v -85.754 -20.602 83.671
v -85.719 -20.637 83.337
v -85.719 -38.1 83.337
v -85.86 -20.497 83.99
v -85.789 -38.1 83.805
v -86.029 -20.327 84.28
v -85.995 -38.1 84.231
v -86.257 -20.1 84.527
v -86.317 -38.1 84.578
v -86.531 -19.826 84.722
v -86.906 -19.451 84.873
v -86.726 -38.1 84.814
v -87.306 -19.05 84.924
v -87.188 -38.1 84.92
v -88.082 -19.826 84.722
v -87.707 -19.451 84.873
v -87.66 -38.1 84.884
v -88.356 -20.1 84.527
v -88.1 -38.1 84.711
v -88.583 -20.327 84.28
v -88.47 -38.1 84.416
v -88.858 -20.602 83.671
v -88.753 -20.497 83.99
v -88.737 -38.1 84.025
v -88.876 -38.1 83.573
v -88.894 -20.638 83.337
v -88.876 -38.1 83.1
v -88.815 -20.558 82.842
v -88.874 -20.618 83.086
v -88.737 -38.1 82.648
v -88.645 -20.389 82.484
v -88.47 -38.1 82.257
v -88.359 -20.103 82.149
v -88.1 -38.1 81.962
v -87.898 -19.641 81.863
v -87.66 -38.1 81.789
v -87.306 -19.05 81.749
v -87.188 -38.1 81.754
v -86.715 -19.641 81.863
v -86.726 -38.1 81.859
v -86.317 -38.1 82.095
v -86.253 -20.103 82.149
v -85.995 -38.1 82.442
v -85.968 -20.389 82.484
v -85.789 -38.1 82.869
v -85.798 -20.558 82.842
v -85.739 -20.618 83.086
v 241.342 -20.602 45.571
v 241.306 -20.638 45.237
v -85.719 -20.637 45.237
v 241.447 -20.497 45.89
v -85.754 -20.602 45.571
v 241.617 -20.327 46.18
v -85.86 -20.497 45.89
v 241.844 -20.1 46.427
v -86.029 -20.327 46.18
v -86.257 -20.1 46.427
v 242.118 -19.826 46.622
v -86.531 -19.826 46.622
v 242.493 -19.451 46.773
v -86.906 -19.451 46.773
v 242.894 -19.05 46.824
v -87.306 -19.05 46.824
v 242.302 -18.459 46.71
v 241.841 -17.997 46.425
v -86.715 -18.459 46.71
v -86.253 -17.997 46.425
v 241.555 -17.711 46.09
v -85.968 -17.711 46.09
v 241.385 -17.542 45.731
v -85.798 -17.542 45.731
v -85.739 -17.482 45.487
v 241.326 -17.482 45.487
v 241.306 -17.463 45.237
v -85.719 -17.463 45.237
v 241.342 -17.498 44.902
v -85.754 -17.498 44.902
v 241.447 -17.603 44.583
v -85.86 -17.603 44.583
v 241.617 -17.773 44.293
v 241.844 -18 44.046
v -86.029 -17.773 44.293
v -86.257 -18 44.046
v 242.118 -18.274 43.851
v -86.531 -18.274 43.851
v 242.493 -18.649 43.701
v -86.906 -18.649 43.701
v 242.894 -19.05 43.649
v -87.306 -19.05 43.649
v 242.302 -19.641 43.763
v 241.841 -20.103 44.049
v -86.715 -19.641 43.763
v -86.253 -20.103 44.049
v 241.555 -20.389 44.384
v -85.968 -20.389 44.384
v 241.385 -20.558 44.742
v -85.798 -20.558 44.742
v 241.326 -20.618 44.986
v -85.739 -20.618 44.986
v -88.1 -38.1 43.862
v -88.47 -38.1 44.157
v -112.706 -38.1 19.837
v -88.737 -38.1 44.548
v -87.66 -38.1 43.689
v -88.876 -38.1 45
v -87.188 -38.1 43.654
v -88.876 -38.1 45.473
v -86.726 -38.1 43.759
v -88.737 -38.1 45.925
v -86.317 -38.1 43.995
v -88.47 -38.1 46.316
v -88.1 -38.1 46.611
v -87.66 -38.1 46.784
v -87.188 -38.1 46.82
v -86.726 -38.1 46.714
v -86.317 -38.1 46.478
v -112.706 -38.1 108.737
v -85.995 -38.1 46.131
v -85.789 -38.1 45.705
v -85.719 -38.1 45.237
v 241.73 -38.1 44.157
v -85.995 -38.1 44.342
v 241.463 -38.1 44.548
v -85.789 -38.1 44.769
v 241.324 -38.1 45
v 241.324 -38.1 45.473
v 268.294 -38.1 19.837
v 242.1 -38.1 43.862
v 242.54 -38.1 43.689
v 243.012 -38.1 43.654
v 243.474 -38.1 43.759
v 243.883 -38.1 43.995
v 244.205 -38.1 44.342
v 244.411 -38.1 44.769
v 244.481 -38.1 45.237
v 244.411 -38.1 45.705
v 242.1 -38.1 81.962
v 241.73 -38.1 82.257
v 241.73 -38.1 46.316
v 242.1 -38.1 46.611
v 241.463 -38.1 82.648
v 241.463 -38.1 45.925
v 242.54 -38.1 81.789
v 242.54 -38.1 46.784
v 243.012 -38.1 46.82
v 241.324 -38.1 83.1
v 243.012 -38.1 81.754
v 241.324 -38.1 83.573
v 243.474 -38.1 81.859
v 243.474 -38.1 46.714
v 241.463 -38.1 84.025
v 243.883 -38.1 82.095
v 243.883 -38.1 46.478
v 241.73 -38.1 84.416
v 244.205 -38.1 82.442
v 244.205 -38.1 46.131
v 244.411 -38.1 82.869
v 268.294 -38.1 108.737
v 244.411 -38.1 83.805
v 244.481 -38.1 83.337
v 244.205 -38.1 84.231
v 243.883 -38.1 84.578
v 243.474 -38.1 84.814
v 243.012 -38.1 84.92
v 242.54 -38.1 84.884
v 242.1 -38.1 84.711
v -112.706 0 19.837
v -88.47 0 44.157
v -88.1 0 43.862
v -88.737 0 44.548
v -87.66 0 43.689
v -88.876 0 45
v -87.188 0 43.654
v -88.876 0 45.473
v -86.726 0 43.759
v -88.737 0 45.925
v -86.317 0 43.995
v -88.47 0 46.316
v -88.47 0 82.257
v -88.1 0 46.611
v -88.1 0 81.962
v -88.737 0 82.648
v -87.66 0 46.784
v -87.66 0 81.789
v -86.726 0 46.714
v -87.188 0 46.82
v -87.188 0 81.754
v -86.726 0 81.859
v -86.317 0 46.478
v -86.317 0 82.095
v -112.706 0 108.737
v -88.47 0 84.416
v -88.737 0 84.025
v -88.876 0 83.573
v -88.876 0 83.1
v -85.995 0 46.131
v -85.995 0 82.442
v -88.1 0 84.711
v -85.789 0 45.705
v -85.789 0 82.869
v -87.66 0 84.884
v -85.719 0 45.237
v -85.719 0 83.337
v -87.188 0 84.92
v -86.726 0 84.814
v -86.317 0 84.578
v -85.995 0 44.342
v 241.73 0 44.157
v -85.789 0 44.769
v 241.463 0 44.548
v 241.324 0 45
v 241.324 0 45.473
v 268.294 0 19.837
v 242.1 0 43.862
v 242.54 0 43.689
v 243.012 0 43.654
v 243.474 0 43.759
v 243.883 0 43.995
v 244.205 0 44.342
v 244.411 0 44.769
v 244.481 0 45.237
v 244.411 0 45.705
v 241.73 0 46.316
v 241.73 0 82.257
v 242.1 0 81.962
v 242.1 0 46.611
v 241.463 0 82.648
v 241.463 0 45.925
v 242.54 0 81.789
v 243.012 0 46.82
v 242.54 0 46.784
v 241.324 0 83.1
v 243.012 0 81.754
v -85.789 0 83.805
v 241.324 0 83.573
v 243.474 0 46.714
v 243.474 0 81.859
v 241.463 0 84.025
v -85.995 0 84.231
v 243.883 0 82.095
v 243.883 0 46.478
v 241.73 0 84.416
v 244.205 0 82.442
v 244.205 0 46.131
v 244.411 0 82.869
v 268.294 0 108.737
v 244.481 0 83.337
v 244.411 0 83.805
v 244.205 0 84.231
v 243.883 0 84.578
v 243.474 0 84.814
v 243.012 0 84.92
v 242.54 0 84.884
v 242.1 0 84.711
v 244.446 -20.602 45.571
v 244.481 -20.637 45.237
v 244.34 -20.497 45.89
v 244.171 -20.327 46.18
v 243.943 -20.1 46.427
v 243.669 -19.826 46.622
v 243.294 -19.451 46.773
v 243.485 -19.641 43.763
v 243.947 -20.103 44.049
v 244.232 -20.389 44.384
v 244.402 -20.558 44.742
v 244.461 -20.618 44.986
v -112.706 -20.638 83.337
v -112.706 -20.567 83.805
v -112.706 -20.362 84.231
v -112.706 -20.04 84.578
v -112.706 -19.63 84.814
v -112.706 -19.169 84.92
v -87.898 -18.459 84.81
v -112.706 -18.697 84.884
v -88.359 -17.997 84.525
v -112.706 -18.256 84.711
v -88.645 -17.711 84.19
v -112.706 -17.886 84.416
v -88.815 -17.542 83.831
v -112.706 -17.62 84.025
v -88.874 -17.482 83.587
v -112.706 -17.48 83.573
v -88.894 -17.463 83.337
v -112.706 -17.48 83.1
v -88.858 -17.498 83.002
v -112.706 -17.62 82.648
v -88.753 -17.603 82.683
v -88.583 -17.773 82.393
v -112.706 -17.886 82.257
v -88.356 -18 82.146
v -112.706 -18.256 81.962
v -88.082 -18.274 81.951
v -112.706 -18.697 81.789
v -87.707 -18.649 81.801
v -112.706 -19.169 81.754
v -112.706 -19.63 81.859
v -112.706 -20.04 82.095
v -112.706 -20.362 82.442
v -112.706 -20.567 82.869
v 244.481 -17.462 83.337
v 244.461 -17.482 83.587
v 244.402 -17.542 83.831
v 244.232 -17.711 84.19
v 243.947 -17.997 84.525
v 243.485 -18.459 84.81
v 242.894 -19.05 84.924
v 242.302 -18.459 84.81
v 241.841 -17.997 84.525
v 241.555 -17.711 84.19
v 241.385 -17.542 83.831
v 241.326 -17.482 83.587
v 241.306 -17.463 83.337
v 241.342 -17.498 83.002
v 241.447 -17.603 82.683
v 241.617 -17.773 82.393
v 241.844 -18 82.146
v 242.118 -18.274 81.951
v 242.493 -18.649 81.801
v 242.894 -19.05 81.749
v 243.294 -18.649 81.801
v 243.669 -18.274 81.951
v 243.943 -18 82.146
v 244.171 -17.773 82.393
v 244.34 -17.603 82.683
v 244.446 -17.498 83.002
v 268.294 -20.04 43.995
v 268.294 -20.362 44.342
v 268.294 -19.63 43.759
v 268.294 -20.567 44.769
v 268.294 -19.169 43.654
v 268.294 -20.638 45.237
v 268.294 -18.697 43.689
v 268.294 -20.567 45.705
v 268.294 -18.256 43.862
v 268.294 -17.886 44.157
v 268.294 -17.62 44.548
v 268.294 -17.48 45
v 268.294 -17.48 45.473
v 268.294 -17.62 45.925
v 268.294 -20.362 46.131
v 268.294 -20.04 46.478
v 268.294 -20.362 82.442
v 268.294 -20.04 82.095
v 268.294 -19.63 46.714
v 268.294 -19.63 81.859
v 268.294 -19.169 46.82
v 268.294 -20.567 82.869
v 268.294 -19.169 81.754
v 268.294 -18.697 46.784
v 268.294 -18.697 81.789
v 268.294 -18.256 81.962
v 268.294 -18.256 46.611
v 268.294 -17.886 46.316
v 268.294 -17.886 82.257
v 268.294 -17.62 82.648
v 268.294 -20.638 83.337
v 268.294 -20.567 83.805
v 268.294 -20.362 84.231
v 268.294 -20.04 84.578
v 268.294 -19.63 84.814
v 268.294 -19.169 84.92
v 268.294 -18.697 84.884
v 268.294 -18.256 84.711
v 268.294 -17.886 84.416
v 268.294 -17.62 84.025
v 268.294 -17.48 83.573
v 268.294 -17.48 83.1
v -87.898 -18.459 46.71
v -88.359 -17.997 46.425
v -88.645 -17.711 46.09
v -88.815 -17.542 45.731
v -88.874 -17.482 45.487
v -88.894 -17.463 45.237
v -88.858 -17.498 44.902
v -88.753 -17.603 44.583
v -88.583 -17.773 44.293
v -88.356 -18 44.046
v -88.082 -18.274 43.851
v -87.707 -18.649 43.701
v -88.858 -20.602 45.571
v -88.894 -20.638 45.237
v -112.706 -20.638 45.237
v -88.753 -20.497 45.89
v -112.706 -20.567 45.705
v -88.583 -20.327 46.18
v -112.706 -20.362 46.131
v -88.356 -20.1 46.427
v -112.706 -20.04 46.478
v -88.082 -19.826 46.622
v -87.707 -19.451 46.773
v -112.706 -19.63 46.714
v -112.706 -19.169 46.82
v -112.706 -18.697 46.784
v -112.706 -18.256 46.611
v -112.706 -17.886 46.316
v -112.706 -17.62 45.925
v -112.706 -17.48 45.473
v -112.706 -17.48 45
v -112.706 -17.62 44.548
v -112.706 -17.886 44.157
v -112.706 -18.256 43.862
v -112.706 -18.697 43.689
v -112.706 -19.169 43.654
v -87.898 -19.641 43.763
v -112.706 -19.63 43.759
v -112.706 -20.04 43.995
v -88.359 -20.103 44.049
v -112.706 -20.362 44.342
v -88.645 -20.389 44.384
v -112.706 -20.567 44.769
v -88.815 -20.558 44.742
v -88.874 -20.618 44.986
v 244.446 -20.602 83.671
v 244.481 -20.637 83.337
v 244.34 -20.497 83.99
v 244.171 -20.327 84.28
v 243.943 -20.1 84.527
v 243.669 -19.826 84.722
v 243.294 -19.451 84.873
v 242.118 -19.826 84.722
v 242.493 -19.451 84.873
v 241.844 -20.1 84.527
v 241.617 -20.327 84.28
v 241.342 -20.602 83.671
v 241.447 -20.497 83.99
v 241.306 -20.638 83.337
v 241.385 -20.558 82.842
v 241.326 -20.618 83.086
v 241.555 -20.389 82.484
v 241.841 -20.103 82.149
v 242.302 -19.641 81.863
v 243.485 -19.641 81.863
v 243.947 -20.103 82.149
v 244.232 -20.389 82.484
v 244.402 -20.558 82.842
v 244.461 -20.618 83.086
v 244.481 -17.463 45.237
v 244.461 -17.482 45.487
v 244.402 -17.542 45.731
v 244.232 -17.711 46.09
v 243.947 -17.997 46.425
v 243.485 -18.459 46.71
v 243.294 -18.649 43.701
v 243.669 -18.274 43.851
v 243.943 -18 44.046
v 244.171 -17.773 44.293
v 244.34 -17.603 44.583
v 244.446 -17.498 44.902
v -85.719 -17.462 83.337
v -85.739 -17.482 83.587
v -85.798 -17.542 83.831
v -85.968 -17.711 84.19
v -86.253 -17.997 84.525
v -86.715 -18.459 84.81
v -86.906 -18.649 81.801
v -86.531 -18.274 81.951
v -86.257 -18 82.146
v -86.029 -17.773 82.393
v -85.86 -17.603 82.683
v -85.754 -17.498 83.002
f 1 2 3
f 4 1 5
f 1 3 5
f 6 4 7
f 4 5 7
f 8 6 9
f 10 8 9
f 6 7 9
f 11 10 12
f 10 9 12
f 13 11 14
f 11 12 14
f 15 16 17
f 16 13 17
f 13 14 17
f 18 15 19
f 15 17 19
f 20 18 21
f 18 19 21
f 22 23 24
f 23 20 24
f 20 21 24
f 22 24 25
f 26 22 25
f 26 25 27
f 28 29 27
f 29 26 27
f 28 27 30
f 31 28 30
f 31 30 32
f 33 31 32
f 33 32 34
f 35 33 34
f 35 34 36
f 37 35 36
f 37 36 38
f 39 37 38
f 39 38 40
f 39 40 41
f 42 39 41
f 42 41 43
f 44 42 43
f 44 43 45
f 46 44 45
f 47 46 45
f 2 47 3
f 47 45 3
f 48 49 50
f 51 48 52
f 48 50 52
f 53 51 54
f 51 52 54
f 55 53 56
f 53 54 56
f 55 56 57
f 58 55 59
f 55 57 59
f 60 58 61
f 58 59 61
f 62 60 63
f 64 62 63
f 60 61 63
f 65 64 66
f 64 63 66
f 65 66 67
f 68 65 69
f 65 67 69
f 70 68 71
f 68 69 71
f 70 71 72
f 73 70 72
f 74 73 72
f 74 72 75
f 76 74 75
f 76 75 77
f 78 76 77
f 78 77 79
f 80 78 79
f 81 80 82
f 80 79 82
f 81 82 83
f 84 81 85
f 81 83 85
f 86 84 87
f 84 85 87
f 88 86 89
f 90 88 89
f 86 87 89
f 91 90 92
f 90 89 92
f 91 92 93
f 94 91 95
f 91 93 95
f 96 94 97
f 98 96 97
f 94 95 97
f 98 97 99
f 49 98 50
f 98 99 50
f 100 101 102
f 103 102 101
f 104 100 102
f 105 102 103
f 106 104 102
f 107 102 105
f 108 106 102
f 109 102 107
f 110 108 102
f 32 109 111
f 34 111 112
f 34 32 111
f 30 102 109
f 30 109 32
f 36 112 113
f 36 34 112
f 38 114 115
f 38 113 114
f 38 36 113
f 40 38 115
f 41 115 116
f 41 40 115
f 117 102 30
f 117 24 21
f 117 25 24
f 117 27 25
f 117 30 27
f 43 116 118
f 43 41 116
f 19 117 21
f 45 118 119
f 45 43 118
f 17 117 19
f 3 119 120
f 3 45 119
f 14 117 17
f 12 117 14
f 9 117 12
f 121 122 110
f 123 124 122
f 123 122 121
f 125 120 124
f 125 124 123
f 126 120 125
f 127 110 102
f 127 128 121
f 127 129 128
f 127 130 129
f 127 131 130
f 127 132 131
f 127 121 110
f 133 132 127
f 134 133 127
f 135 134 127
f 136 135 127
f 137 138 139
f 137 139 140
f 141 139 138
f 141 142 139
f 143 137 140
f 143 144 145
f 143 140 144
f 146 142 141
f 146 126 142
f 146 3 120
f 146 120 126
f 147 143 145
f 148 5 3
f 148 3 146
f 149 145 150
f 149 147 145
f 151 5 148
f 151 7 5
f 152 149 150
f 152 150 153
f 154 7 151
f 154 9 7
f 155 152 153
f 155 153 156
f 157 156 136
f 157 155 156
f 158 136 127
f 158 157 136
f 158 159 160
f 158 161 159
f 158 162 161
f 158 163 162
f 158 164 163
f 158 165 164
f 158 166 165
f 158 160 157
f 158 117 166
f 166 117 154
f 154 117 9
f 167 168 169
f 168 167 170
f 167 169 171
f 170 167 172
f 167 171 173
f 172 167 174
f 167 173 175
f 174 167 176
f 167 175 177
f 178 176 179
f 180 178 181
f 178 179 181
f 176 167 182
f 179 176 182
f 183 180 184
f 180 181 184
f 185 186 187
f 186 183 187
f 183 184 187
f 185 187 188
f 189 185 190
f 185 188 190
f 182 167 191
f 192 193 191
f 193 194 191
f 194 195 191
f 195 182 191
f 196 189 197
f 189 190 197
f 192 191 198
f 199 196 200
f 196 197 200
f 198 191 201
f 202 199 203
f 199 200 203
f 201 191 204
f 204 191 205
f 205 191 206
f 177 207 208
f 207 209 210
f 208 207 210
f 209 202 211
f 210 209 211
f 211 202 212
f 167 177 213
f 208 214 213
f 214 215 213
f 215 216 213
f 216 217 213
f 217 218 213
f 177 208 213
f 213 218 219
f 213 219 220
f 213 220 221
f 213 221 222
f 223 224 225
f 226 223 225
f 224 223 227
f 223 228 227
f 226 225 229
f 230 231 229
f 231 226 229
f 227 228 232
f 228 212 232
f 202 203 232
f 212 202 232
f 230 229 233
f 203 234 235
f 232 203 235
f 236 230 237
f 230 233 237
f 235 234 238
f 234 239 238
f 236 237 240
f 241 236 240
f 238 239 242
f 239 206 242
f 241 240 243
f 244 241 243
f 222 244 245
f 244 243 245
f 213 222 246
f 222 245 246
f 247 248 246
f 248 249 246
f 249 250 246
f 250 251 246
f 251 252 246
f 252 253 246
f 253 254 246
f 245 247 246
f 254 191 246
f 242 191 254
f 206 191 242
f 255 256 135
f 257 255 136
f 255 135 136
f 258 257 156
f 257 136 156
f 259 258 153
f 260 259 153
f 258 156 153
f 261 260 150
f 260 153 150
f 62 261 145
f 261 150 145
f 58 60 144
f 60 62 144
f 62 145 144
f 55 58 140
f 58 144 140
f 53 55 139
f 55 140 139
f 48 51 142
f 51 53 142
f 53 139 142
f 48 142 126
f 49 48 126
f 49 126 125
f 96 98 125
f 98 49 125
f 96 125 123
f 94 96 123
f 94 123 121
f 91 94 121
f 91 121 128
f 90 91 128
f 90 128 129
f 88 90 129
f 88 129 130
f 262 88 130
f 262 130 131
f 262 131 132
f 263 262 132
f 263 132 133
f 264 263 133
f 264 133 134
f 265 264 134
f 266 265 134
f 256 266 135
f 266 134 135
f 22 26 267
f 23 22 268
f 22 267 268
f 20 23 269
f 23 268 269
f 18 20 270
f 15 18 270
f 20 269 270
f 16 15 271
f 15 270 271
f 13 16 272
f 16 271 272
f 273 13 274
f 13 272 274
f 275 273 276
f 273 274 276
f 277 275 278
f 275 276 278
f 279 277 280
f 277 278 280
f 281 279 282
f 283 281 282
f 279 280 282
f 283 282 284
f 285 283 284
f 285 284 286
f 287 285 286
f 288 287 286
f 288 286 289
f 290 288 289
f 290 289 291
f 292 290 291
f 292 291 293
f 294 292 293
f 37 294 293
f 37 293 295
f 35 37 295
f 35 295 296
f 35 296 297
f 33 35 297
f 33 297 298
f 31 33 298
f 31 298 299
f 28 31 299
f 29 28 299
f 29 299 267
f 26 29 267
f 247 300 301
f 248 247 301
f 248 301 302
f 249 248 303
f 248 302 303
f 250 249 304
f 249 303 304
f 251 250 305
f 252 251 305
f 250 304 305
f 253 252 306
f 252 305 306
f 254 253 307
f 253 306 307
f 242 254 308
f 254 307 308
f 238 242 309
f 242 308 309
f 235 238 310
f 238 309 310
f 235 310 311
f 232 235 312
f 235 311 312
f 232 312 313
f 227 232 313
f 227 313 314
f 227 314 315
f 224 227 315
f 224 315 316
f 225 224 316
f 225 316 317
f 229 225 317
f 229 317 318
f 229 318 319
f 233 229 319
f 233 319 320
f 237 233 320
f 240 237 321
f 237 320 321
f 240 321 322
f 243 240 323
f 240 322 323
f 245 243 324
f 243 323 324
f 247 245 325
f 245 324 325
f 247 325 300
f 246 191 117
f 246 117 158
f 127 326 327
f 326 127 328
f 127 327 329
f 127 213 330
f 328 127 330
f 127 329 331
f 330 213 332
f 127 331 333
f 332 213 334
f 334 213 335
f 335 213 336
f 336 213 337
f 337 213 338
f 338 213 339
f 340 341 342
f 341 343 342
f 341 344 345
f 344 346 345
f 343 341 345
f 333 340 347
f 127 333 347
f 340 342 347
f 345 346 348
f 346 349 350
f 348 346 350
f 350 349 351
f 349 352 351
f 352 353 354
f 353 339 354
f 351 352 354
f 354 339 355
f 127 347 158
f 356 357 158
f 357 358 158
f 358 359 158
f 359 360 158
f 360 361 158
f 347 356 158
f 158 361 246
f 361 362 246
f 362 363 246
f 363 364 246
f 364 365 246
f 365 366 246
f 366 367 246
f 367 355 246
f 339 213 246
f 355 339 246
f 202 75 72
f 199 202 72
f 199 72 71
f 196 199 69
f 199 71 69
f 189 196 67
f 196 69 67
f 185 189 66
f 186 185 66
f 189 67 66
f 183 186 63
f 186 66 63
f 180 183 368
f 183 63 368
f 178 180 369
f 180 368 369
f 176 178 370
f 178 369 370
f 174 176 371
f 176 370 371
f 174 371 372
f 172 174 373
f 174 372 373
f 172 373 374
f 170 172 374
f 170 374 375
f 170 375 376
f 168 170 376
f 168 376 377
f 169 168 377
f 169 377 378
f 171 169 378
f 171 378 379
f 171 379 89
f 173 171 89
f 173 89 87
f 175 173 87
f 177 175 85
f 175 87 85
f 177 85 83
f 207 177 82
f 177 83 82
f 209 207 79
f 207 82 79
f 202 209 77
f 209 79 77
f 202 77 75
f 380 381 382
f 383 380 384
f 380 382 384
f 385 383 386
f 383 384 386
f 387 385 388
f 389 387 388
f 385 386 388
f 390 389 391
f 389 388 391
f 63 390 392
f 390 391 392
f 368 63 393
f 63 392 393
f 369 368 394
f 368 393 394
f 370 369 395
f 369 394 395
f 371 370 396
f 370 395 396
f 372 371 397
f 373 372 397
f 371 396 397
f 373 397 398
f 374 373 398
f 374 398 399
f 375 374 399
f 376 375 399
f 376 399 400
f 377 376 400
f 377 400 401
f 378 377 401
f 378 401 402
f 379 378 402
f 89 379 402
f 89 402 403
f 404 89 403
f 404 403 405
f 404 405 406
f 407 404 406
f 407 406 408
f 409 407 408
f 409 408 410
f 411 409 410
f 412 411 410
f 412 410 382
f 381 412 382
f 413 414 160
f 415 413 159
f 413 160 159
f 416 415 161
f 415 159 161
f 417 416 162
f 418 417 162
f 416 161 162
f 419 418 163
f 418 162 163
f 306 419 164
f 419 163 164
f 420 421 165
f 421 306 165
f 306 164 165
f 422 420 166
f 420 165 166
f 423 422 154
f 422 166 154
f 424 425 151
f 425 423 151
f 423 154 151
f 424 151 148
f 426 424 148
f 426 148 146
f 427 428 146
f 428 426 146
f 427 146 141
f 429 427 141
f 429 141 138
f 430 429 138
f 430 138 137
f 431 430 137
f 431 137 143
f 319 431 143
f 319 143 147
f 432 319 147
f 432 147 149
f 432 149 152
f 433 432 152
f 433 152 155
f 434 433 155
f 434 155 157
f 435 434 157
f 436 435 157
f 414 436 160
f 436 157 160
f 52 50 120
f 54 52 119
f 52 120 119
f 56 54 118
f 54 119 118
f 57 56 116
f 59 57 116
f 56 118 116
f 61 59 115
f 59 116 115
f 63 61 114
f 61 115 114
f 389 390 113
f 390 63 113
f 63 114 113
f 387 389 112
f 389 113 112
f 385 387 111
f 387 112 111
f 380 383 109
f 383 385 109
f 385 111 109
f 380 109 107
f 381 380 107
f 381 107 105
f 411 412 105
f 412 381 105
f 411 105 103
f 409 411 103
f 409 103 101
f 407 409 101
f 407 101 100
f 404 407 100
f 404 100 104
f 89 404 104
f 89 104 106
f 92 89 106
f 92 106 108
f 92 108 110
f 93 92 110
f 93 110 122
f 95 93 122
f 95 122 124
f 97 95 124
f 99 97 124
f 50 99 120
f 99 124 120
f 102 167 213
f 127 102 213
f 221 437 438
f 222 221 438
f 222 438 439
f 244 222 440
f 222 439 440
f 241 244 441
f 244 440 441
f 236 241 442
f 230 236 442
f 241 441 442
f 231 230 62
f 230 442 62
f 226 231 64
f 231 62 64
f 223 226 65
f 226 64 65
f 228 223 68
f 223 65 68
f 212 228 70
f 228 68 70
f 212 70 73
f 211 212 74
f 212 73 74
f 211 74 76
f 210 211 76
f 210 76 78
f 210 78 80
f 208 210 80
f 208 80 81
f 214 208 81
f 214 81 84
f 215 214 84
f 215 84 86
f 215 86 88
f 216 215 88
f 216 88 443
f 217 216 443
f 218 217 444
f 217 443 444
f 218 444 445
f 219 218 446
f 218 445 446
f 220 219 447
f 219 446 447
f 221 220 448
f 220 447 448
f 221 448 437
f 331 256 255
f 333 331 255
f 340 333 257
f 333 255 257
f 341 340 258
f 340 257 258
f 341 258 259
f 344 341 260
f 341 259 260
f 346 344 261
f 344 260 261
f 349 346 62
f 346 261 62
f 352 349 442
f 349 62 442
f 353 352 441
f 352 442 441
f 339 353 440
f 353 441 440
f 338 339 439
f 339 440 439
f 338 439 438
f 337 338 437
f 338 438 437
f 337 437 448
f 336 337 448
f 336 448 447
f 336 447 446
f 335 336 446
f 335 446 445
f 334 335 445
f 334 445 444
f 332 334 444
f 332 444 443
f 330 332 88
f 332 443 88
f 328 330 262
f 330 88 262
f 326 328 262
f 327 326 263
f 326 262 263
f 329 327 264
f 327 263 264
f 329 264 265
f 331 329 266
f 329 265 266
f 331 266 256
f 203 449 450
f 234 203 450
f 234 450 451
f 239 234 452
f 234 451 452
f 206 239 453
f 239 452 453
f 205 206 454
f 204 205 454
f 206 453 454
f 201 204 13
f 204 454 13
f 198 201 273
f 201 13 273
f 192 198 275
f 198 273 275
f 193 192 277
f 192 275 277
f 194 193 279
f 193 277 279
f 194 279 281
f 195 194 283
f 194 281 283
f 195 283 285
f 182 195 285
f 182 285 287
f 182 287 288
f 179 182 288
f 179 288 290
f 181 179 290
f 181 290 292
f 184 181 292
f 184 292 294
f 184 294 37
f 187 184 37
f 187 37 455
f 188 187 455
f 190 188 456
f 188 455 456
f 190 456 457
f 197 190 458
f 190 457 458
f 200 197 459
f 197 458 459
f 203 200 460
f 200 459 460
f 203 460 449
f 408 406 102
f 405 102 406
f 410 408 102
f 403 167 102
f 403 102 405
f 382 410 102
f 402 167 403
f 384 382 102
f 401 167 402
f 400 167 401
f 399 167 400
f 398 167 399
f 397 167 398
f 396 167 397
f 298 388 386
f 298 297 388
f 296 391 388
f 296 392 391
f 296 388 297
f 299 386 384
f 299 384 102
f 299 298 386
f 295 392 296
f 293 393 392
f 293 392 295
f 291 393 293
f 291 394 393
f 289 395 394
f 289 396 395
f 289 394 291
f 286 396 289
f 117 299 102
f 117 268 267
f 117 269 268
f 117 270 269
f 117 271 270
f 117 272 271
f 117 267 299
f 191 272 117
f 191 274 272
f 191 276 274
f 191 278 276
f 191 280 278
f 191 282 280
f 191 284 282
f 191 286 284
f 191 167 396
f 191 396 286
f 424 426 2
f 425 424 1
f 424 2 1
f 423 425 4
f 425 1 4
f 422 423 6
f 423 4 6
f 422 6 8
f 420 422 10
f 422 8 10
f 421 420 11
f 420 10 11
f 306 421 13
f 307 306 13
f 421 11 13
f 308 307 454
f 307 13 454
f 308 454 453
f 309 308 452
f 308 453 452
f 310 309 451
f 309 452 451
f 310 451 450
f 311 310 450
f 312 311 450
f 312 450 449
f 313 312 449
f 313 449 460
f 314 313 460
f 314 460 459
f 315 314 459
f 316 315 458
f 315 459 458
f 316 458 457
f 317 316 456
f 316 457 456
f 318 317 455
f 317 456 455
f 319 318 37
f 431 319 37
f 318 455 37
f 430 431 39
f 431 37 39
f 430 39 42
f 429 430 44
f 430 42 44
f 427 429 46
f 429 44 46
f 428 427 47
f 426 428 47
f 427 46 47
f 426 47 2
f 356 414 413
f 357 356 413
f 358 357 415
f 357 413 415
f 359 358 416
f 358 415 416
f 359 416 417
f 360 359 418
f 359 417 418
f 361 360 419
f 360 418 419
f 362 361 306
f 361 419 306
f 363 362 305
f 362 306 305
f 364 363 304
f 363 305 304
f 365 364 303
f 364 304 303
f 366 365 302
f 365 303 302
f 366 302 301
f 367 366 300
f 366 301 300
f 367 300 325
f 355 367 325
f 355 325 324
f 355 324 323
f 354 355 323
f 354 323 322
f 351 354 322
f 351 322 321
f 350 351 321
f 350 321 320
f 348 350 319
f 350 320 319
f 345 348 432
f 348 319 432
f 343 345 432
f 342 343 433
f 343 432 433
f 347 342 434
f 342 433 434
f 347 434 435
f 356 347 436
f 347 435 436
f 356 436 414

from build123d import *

# Parameters (mm, degrees)
F0_W     = 381
F0_H     = 88.9
F1_DEPTH = 38.1
F3_D     = 3.175
F5_D     = 3.175


with BuildPart() as f1:
    # F0 (on Front) → F1 (new body)
    with BuildSketch(Plane.XZ):
        with Locations((77.79364, 64.286581)):
            Rectangle(F0_W, F0_H)
    extrude(amount=F1_DEPTH)

    # F3 (through all)
    with Locations(Plane.YZ.offset(268.29364)):
        with Locations((-19.05, 83.336581), (-19.05, 45.236581)):
            Hole(F3_D / 2)

    # F5 (through all)
    with Locations(Plane(origin=(0, 0, 0), x_dir=(-1, 0, 0), z_dir=(0, 1, 0))):
        with Locations((-242.89364, 83.336581), (-242.89364, 45.236581), (87.30636, 83.336581), (87.30636, 45.236581)):
            Hole(F5_D / 2)


solid = f1.part
